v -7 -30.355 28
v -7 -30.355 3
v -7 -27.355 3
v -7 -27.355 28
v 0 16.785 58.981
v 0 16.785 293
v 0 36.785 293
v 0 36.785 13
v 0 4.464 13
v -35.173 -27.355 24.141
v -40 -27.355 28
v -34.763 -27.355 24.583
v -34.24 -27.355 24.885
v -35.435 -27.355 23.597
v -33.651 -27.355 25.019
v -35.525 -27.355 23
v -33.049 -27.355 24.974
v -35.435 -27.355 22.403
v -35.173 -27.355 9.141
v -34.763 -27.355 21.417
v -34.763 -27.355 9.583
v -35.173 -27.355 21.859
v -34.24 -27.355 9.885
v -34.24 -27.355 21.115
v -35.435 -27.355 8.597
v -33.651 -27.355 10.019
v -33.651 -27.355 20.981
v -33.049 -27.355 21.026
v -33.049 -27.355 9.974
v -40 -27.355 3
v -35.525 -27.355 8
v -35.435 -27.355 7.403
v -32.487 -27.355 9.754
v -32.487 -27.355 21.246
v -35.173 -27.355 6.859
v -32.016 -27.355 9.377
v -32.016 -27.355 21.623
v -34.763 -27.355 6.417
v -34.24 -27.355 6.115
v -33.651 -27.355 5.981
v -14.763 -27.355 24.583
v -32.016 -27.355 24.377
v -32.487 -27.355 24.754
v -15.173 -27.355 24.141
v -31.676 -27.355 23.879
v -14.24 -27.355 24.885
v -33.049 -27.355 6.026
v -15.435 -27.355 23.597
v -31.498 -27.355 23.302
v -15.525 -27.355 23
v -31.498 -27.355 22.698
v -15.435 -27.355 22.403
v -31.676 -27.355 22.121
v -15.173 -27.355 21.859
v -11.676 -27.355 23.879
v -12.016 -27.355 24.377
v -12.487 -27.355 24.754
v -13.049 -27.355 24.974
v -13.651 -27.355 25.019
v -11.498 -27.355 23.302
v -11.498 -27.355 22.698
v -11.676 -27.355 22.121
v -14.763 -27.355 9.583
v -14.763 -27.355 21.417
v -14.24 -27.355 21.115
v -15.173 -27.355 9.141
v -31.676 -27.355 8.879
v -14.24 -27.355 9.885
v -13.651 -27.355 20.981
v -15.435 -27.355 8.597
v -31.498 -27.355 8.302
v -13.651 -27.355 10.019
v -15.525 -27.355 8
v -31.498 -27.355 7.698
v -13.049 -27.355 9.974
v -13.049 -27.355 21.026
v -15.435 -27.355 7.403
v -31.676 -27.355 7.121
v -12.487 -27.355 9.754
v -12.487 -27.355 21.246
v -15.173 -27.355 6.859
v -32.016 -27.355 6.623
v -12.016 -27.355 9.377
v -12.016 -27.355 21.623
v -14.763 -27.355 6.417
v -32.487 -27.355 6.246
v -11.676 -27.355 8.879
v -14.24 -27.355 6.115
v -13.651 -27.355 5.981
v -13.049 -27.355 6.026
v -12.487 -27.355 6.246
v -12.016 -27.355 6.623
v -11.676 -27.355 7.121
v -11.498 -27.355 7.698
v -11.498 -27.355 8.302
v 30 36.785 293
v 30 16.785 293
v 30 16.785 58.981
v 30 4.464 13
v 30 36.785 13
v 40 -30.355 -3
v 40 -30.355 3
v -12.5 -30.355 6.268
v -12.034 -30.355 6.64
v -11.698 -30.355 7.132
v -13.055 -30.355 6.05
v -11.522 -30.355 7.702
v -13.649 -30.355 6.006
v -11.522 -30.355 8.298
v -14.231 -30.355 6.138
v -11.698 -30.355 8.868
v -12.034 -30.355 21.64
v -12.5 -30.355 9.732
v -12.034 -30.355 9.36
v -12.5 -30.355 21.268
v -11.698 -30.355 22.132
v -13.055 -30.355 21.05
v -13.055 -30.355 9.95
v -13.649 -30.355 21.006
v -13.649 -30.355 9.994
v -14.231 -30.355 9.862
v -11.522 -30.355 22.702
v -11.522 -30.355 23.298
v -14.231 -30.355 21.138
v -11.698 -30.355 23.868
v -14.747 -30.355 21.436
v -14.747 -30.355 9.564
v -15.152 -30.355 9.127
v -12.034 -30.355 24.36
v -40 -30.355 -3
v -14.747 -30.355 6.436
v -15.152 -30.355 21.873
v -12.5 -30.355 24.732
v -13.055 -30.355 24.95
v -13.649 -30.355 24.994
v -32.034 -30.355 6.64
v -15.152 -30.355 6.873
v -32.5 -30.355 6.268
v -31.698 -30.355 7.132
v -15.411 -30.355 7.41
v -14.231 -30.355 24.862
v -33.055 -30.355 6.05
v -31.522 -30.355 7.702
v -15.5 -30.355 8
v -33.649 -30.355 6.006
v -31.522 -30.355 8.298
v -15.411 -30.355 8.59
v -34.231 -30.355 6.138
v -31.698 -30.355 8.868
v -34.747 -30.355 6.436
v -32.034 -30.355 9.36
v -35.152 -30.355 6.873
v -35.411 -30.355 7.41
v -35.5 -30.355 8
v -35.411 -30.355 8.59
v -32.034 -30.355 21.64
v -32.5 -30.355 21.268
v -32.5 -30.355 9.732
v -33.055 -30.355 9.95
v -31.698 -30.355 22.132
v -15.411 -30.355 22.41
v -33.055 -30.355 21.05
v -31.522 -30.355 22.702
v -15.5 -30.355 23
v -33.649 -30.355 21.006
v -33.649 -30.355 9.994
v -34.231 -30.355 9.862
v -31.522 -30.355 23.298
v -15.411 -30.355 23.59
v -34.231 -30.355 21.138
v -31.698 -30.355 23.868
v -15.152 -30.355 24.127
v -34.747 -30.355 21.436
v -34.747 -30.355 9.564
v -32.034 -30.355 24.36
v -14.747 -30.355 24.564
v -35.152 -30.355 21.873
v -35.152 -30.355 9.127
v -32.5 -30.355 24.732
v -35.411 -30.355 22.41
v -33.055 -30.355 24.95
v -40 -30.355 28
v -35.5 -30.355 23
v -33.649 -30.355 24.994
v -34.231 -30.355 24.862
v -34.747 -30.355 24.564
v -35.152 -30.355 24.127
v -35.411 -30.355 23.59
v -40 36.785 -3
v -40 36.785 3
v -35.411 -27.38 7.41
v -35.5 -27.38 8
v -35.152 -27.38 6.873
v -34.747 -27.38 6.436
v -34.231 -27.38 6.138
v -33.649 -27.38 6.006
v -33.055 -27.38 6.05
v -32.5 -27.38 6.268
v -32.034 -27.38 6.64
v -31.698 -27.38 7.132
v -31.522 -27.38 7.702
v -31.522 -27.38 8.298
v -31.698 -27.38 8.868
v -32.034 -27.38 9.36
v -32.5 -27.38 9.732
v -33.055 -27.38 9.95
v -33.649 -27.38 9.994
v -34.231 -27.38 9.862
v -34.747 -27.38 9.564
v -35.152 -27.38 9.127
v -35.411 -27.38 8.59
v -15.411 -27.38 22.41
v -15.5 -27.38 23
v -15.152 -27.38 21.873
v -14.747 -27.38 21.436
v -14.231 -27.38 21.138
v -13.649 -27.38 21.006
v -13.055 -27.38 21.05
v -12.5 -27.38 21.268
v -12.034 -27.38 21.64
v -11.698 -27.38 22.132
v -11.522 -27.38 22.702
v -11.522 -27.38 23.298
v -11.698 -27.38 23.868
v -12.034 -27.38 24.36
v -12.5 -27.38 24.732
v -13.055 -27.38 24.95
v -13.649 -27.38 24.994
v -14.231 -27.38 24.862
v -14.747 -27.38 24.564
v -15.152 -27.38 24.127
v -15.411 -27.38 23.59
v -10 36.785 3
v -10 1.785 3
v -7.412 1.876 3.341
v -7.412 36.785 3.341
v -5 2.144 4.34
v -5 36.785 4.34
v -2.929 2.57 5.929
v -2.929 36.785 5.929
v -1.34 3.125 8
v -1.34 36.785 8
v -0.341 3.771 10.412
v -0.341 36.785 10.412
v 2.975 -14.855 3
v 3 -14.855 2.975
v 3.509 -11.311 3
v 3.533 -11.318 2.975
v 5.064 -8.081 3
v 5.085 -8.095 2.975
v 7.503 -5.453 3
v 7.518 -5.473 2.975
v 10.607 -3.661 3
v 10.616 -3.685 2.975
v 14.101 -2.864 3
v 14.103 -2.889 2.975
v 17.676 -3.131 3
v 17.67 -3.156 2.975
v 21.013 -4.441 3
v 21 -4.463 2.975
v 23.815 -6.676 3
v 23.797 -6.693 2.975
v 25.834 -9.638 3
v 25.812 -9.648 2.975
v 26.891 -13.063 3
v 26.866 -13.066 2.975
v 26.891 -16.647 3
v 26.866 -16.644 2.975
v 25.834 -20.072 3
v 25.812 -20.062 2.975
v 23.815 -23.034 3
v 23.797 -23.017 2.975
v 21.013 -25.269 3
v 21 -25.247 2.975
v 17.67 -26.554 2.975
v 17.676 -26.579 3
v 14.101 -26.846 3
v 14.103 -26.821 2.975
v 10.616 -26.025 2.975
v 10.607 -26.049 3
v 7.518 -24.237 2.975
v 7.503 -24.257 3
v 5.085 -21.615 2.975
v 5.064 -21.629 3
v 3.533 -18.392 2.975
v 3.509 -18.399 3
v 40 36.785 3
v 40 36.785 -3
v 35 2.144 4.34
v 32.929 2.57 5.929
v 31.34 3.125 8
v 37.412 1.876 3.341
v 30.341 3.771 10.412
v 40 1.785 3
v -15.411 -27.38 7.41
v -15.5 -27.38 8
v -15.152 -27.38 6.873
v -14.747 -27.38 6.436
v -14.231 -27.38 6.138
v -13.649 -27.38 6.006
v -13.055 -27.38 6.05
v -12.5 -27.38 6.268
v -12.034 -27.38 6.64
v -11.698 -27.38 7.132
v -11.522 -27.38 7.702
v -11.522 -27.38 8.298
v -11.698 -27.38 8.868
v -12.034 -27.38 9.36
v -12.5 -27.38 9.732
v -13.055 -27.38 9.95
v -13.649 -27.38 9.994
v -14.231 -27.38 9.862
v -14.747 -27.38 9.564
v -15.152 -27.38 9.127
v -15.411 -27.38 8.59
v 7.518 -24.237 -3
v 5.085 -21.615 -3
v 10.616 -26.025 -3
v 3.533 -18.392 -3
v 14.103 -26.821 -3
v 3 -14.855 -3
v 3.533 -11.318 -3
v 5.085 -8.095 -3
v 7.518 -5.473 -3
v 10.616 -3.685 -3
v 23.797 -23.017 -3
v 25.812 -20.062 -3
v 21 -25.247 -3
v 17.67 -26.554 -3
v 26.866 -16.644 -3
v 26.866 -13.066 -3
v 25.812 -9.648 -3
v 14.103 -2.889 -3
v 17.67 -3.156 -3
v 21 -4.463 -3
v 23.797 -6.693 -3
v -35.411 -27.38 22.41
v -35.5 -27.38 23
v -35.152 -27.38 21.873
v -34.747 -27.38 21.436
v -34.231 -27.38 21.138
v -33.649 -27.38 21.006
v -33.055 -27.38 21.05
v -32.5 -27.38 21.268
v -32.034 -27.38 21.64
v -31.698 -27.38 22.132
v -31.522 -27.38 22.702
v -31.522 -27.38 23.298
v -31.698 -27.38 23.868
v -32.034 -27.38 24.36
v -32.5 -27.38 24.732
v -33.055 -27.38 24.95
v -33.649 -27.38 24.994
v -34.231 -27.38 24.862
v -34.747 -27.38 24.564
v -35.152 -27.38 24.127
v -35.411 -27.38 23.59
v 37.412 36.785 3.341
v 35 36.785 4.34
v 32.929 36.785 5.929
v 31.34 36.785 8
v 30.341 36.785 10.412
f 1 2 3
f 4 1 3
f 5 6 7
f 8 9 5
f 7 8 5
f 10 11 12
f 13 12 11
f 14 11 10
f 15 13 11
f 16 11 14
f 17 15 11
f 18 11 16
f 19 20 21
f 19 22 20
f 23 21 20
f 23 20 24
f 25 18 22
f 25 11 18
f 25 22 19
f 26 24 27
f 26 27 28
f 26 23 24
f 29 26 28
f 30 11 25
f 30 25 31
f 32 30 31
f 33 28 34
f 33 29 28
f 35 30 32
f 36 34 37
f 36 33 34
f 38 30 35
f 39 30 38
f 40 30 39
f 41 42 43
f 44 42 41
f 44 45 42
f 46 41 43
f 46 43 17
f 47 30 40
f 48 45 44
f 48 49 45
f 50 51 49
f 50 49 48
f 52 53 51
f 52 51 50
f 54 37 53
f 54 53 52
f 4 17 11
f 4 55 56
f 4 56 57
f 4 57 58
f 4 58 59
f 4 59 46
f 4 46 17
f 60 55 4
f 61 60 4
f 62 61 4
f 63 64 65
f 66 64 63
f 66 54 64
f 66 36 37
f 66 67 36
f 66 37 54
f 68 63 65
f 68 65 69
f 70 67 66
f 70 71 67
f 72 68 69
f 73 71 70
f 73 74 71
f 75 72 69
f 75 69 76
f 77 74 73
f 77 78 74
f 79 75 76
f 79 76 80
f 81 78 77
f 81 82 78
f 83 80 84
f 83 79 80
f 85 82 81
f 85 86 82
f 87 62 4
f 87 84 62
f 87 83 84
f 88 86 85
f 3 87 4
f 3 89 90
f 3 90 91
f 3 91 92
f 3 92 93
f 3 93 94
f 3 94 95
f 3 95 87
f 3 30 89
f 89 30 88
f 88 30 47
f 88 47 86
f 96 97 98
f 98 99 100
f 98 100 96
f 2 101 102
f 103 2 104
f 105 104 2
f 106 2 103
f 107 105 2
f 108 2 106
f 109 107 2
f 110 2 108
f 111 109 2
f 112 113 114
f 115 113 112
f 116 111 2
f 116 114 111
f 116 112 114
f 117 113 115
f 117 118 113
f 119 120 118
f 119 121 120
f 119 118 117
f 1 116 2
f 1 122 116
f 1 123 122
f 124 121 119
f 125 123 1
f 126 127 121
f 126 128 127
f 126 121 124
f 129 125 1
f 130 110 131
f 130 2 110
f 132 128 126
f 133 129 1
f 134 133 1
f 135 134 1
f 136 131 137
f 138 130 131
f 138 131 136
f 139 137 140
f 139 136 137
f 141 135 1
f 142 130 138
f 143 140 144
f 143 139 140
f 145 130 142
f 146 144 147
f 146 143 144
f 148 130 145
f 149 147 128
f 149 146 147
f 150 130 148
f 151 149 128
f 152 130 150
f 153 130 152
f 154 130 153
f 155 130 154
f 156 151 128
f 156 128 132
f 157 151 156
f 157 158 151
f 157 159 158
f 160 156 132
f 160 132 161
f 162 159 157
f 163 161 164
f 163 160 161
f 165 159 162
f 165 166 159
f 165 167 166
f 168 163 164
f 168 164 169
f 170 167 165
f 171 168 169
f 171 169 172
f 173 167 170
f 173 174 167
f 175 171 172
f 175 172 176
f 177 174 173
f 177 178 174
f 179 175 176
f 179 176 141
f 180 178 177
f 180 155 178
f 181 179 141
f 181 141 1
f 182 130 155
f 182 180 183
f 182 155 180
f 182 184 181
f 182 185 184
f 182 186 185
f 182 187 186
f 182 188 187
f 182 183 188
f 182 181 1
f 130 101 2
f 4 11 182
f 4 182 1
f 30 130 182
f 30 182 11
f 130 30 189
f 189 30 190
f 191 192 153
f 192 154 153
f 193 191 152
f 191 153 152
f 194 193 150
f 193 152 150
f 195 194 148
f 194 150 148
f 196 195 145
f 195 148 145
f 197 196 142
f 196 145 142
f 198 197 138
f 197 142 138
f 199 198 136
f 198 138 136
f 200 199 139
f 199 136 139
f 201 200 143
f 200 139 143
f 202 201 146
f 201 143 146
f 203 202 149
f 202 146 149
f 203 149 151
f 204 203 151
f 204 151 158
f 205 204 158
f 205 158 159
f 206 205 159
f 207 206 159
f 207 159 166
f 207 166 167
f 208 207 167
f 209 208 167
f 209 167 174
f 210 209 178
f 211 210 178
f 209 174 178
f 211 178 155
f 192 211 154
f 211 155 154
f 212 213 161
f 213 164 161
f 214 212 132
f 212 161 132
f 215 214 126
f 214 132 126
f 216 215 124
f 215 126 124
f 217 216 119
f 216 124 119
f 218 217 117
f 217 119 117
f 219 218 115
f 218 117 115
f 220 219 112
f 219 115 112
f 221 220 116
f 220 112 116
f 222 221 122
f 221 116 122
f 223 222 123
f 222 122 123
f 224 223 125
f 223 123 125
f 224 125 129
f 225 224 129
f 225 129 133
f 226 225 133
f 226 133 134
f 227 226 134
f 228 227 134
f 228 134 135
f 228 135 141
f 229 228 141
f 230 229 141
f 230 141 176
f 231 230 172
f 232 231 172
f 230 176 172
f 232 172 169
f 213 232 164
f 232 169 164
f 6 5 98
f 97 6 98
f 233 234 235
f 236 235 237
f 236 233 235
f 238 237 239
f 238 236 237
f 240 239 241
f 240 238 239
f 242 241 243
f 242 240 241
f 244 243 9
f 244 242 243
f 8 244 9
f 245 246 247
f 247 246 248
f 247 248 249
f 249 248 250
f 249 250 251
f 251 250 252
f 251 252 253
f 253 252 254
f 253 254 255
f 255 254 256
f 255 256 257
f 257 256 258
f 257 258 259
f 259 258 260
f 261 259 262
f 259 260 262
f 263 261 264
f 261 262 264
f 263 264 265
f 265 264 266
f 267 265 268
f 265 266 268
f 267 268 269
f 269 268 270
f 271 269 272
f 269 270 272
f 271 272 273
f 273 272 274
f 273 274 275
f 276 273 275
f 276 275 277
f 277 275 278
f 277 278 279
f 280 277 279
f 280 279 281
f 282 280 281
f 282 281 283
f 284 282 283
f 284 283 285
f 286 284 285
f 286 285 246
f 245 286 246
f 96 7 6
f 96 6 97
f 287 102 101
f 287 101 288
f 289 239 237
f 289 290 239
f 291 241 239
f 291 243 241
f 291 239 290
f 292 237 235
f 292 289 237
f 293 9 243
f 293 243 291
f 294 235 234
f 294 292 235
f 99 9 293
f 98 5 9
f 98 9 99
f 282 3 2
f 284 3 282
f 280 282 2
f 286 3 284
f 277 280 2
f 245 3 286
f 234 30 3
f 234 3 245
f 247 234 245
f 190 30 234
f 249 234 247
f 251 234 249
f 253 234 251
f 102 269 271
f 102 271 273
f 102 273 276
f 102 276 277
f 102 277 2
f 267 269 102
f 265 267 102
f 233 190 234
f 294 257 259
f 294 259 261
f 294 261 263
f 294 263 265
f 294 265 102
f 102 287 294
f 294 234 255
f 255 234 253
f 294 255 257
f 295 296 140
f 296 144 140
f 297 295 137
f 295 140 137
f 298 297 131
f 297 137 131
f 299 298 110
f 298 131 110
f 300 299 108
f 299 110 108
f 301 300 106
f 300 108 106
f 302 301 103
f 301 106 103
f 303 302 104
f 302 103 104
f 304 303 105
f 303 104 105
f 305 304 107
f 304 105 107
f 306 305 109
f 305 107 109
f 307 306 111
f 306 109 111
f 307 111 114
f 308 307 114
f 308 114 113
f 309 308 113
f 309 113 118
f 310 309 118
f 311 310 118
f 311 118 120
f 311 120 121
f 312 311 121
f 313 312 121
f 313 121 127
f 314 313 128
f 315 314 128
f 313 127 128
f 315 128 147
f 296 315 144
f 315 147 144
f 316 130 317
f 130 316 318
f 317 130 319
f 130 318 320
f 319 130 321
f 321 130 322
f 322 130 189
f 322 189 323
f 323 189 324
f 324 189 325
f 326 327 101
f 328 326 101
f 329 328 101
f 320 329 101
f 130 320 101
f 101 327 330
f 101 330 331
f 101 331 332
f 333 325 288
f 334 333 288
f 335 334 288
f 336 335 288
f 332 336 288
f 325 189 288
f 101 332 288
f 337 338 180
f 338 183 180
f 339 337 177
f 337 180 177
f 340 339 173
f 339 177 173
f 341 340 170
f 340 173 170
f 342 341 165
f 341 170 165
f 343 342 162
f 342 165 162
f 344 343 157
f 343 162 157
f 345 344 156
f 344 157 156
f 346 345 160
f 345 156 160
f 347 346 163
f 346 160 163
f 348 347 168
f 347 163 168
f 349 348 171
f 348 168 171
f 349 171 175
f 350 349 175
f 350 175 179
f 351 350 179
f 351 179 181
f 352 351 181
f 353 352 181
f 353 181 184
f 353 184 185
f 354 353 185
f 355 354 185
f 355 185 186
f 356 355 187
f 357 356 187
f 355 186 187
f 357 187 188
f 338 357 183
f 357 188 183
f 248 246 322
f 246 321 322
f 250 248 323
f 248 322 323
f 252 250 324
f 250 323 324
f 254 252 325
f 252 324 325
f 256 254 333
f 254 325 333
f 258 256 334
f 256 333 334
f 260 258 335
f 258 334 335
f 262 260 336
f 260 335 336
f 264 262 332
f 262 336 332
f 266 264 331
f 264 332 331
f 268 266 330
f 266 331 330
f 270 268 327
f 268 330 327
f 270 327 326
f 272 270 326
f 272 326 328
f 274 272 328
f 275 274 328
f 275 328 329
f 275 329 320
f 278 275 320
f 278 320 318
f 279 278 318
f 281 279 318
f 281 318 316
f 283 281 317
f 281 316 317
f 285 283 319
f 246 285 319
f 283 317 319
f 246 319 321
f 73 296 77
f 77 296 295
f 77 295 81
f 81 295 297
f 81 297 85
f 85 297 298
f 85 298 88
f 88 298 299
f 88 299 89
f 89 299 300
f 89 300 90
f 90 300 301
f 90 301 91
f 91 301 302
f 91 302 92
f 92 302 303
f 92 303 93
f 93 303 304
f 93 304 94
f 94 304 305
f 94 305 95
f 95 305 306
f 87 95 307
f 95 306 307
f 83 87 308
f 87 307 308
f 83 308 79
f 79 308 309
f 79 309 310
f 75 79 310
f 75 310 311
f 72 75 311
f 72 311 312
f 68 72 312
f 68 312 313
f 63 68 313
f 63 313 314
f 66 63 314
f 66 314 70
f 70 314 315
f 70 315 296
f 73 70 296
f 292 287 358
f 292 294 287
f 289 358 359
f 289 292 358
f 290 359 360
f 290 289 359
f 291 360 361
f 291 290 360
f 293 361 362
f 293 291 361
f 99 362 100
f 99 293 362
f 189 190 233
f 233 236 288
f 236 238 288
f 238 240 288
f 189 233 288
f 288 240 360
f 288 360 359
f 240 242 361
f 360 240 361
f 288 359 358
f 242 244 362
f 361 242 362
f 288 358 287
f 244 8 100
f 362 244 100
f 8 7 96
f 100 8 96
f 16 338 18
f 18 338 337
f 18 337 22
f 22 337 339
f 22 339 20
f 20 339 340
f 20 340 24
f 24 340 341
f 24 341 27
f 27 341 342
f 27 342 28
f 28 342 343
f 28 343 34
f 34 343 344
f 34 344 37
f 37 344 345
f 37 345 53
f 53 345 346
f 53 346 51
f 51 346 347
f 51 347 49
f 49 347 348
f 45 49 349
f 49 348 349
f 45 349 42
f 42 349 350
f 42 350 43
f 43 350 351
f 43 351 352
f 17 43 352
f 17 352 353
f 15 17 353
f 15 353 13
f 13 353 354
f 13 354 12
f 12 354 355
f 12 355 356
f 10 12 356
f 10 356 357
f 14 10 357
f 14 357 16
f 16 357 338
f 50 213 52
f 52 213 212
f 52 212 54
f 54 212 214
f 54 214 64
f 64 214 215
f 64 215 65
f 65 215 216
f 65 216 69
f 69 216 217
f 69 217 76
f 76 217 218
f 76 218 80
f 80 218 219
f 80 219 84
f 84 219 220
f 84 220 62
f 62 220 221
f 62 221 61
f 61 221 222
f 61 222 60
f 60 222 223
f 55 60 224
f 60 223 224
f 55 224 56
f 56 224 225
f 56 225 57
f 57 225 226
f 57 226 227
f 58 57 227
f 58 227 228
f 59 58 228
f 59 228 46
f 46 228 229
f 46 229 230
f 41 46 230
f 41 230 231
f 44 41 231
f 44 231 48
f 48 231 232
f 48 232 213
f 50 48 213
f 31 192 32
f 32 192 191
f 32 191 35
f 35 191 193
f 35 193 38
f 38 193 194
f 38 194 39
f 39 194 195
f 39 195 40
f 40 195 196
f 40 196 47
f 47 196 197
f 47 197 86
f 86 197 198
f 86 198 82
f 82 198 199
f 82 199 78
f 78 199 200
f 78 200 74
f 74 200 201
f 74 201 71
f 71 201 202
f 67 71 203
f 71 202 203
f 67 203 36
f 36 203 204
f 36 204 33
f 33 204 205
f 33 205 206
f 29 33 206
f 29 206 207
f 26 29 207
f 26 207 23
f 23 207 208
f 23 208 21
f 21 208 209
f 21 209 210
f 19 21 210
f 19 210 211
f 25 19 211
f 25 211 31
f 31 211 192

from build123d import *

# Parameters (mm, degrees)
SKETCH1_W                            = 80
SKETCH1_H                            = 73.57
BOSS_EXTRUDE1_DEPTH                  = 3
SKETCH2_W                            = 33
SKETCH2_H                            = 3
BOSS_EXTRUDE2_DEPTH                  = 25
F_4_0_4_DIAMETER_HOLE1_D             = 4
F_4_0_4_DIAMETER_HOLE1_DEPTH         = 8
F_4_0_4_DIAMETER_HOLE1_CSINK_D       = 4.05
F_4_0_4_DIAMETER_HOLE1_CSINK_ANGLE   = 90
F_4_0_4_DIAMETER_HOLE1_TIP           = 1.201721238
F_24_0_24_DIAMETER_HOLE1_D           = 24
F_24_0_24_DIAMETER_HOLE1_DEPTH       = 8
F_24_0_24_DIAMETER_HOLE1_CSINK_D     = 24.05
F_24_0_24_DIAMETER_HOLE1_CSINK_ANGLE = 90
F_24_0_24_DIAMETER_HOLE1_TIP         = 7.210327428
SKETCH11_W                           = 6
SKETCH11_H                           = 6.43
CUT_EXTRUDE2_DEPTH                   = 93.396624533
SKETCH12_W                           = 30
SKETCH12_H                           = 20
BOSS_EXTRUDE5_DEPTH                  = 290
CHAMFER3_SIZE                        = 15
CHAMFER3_SIZE2                       = 55.980762114
FILLET1_R                            = 10


with BuildPart() as part:
    # Sketch1 → Boss-Extrude1 (new, symmetric)
    with BuildSketch(Plane.XY):
        Rectangle(SKETCH1_W, SKETCH1_H)
    extrude(amount=BOSS_EXTRUDE1_DEPTH, both=True)

    # Sketch2 → Boss-Extrude2 (add)
    with BuildSketch(Plane.XY.offset(3)):
        with Locations((-23.5, -28.855)):
            Rectangle(SKETCH2_W, SKETCH2_H)
    extrude(amount=BOSS_EXTRUDE2_DEPTH)

    # Ø4.0 (4) Diameter Hole1
    with Locations(Plane(origin=(0, -27.355, 0), x_dir=(1, 0, 0), z_dir=(0, 1, 0))):
        with Locations((-33.5, -8), (-13.5, -8), (-13.5, -23), (-33.5, -23)):
            CounterSinkHole(F_4_0_4_DIAMETER_HOLE1_D / 2, F_4_0_4_DIAMETER_HOLE1_CSINK_D / 2, depth=F_4_0_4_DIAMETER_HOLE1_DEPTH, counter_sink_angle=F_4_0_4_DIAMETER_HOLE1_CSINK_ANGLE)
            with Locations((0, 0, -(F_4_0_4_DIAMETER_HOLE1_DEPTH + F_4_0_4_DIAMETER_HOLE1_TIP / 2))):  # 118° drill point
                Cone(0, F_4_0_4_DIAMETER_HOLE1_D / 2, F_4_0_4_DIAMETER_HOLE1_TIP, mode=Mode.SUBTRACT)

    # Ø24.0 (24) Diameter Hole1
    with Locations(Plane.XY.offset(3)):
        with Locations((15, -14.855)):
            CounterSinkHole(F_24_0_24_DIAMETER_HOLE1_D / 2, F_24_0_24_DIAMETER_HOLE1_CSINK_D / 2, depth=F_24_0_24_DIAMETER_HOLE1_DEPTH, counter_sink_angle=F_24_0_24_DIAMETER_HOLE1_CSINK_ANGLE)
            with Locations((0, 0, -(F_24_0_24_DIAMETER_HOLE1_DEPTH + F_24_0_24_DIAMETER_HOLE1_TIP / 2))):  # 118° drill point
                Cone(0, F_24_0_24_DIAMETER_HOLE1_D / 2, F_24_0_24_DIAMETER_HOLE1_TIP, mode=Mode.SUBTRACT)

    # Sketch11 → Cut-Extrude2 (cut, through all)
    with BuildSketch(Plane.ZY.offset(40)):
        with Locations((0, -33.57)):
            Rectangle(SKETCH11_W, SKETCH11_H)
    extrude(amount=-CUT_EXTRUDE2_DEPTH, mode=Mode.SUBTRACT)

    # Sketch12 → Boss-Extrude5 (add)
    with BuildSketch(Plane.XY.offset(3)):
        with Locations((15, 26.785)):
            Rectangle(SKETCH12_W, SKETCH12_H)
    extrude(amount=BOSS_EXTRUDE5_DEPTH)

    # Chamfer3
    chamfer3_edges = [part.edges().sort_by_distance(p)[0] for p in [
        (15, 16.785, 3),
    ]]
    chamfer3_side = [part.faces().sort_by_distance(p)[0] for p in [
        (-3.197697434, 2.561053146, 3),
    ]]
    chamfer(chamfer3_edges, length=CHAMFER3_SIZE, length2=CHAMFER3_SIZE2, reference=chamfer3_side[0])

    # Fillet1
    fillet1_edges = [part.edges().sort_by_distance(p)[0] for p in [
        (0, 19.285, 3),
        (30, 19.285, 3),
    ]]
    fillet(fillet1_edges, radius=FILLET1_R - 0.0001)  # a hair under: the kernel refuses the full size


solid = part.part
